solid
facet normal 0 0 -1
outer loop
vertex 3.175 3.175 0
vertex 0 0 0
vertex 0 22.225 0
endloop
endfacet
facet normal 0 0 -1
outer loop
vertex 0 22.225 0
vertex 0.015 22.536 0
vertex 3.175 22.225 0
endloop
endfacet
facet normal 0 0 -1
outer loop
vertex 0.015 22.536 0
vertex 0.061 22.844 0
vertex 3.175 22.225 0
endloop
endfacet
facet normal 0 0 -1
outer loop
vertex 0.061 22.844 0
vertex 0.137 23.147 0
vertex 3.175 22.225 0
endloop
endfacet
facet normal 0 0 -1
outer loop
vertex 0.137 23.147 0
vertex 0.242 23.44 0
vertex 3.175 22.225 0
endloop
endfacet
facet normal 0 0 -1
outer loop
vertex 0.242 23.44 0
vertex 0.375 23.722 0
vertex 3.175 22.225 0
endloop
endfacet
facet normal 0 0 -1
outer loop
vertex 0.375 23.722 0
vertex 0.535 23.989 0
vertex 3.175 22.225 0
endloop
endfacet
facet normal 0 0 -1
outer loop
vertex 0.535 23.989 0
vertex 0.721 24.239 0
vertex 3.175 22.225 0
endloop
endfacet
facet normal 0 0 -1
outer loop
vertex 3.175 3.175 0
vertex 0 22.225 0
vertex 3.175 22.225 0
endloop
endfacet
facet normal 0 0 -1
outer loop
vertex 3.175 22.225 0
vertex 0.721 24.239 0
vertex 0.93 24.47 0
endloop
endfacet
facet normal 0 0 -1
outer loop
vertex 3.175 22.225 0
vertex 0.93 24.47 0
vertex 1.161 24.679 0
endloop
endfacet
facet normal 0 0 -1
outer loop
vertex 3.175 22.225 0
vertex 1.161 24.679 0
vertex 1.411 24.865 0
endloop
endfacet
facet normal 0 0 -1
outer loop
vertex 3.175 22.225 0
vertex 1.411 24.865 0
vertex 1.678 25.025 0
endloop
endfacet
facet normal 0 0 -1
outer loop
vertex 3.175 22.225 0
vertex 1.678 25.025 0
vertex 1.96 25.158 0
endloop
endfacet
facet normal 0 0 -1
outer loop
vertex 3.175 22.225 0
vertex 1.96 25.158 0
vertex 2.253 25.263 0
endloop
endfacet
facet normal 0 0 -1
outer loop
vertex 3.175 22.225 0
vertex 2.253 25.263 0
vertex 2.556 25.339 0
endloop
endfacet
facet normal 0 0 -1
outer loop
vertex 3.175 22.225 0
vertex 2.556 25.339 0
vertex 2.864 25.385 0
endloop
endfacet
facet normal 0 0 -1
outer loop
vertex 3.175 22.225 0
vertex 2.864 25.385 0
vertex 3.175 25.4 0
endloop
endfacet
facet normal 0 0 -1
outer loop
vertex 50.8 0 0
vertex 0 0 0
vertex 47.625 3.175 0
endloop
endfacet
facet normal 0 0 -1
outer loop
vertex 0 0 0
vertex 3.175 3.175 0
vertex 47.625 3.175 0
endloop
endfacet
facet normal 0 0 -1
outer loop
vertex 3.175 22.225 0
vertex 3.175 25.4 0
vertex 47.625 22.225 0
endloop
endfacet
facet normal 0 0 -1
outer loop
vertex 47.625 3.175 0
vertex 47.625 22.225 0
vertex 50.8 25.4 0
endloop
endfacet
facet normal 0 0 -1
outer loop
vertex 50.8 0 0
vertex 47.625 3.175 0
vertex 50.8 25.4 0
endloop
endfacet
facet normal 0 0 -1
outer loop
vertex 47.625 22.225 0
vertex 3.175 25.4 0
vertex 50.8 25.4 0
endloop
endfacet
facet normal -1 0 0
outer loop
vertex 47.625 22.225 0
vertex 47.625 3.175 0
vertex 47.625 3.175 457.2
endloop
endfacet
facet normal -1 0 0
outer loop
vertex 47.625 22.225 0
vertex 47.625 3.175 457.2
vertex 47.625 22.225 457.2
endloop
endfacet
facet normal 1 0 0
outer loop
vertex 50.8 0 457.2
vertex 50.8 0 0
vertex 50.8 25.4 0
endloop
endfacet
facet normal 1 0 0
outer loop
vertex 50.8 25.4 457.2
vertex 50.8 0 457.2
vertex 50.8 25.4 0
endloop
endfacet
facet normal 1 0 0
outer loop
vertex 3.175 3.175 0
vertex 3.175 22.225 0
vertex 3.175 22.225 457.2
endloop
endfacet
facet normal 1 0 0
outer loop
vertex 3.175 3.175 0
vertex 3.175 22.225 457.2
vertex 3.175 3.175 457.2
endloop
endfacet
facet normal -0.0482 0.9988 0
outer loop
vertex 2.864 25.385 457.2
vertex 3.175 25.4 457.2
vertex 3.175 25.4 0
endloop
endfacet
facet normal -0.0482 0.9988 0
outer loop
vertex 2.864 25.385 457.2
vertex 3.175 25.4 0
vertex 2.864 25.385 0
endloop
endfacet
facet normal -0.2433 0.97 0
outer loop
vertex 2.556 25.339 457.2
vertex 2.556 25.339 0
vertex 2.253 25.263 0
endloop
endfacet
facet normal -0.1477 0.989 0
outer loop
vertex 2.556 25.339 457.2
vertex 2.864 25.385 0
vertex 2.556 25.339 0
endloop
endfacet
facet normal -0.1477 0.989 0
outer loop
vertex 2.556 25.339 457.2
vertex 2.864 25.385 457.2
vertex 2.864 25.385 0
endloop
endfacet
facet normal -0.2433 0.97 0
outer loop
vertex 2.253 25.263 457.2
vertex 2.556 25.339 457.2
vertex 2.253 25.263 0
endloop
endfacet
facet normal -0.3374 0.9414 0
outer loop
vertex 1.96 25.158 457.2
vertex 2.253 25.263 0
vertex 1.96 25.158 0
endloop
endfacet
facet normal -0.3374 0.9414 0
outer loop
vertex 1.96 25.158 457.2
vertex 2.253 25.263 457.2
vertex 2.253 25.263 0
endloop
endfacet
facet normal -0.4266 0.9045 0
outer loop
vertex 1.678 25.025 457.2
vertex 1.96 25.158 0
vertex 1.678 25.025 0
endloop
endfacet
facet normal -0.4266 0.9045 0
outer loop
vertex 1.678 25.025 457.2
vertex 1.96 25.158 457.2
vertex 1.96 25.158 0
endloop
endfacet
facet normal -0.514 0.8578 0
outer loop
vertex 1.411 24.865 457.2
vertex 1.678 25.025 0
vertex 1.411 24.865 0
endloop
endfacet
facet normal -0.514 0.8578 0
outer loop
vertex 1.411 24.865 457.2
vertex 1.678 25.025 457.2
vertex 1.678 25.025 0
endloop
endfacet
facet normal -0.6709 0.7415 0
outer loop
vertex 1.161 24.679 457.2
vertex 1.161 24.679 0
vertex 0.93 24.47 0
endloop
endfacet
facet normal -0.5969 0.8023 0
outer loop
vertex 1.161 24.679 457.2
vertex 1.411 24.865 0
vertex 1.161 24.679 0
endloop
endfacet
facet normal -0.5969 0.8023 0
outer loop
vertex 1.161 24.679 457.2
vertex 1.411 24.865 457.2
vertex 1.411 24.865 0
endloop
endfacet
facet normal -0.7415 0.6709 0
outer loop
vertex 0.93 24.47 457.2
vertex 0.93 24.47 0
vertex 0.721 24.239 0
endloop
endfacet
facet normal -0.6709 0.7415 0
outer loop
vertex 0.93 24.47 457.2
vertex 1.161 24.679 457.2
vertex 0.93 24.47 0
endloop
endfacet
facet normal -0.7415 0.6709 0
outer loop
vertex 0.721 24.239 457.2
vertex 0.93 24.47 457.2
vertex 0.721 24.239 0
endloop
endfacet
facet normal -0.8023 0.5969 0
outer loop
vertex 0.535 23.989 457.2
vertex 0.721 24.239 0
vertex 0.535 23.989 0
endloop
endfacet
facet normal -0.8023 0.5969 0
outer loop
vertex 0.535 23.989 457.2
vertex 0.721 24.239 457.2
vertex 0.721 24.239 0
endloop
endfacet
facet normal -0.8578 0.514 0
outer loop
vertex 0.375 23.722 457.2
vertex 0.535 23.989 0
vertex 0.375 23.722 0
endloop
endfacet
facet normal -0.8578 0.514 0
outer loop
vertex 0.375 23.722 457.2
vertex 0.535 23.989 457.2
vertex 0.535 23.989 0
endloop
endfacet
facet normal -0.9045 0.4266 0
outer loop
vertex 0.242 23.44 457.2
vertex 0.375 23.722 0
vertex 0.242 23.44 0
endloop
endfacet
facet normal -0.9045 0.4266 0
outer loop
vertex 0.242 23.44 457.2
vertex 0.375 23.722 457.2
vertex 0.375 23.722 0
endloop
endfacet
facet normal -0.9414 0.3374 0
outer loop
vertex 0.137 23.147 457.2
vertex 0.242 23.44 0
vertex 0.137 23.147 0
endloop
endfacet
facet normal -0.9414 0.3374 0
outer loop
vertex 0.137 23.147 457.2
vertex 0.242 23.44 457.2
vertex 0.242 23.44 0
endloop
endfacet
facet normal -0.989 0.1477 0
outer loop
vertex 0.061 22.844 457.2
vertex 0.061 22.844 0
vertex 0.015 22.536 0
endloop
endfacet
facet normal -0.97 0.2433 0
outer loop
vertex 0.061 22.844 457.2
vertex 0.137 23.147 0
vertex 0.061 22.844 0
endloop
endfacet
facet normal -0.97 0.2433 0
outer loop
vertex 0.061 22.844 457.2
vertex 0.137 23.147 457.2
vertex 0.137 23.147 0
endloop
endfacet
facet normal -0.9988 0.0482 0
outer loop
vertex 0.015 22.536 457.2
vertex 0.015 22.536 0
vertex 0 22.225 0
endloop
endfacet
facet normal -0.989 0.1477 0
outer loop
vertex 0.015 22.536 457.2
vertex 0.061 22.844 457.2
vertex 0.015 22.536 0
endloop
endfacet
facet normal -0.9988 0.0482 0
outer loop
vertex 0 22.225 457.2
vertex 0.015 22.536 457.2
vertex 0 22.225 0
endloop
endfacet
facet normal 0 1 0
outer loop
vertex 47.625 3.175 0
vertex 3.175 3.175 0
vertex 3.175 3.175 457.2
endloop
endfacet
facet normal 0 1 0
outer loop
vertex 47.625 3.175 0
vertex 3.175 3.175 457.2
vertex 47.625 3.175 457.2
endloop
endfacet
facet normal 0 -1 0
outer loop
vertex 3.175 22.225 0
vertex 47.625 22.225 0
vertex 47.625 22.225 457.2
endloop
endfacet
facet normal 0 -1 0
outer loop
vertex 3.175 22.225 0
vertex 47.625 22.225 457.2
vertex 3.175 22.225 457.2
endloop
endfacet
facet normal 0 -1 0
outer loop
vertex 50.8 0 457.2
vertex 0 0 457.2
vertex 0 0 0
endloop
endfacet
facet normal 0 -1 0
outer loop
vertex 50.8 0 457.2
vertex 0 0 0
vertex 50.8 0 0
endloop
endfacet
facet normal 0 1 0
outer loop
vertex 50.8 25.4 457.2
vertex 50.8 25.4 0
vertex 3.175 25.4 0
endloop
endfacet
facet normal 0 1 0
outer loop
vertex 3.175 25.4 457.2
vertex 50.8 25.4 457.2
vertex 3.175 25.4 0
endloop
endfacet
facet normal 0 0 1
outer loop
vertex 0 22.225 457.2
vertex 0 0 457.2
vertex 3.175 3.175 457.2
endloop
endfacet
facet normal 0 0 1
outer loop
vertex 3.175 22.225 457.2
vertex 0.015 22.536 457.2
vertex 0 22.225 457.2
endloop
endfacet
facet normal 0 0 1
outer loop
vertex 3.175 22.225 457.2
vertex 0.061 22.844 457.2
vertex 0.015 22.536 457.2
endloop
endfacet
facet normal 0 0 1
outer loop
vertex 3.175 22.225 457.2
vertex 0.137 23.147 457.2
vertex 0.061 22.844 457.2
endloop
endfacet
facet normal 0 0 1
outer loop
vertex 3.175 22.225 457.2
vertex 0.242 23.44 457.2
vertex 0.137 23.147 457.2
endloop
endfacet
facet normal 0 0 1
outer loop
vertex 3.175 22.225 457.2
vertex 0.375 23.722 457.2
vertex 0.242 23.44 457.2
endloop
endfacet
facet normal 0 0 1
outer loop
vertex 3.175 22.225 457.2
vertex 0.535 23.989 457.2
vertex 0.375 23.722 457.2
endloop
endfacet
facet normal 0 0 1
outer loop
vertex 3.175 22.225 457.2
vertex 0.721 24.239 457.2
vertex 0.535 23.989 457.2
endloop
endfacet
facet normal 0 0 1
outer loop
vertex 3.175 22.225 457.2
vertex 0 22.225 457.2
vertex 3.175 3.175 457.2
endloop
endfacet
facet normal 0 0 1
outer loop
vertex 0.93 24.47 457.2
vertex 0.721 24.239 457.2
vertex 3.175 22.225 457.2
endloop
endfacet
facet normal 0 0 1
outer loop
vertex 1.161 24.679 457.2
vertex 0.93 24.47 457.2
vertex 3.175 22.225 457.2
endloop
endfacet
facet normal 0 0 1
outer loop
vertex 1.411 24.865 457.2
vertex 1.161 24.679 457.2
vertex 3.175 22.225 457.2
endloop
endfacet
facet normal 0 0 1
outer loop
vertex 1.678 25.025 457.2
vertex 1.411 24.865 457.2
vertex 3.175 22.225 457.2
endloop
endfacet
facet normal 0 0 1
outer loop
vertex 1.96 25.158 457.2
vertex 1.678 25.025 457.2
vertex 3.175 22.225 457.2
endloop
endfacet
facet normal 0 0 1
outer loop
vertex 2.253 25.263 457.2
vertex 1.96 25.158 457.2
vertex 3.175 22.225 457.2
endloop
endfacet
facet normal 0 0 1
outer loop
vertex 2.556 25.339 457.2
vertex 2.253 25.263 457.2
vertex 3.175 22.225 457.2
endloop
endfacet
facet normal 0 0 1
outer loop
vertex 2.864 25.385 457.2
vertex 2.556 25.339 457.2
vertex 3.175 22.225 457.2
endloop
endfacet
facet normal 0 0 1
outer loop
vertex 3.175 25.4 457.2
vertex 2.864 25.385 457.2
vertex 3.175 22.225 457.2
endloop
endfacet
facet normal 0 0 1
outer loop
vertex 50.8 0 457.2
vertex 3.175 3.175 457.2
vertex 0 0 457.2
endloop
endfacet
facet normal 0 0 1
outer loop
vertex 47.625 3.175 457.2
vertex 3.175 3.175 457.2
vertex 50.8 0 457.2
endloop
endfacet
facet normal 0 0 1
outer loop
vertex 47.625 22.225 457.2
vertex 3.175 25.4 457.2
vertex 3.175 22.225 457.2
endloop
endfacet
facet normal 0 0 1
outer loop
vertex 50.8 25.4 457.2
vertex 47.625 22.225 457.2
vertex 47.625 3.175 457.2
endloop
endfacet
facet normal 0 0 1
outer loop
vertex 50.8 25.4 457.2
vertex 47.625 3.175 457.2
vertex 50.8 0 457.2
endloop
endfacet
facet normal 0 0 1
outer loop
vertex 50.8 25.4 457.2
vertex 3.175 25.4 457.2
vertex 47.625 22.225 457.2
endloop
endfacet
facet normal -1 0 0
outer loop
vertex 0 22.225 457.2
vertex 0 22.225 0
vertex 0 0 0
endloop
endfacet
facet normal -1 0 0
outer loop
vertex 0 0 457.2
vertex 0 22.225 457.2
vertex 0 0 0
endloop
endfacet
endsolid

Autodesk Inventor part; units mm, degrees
ref_plane "YZ Plane" through (0, 0, 0) normal (1, 0, 0) x (0, 1, 0)
ref_plane "XZ Plane" through (0, 0, 0) normal (0, 1, 0) x (-1, 0, 0)
ref_plane "XY Plane" through (0, 0, 0) normal (0, 0, 1) x (1, 0, 0)
sketch "Sketch1" plane through (0, 0, 0) normal (0, 0, 1) x (1, 0, 0)
  line L0 (0, 0) -> (50.8, 0)
  line L1 (50.8, 0) -> (50.8, 25.4)
  line L2 (50.8, 25.4) -> (0, 25.4)
  line L3 (0, 25.4) -> (0, 0)
  line L4 (3.175, 3.175) -> (47.625, 3.175)
  line L5 (47.625, 3.175) -> (47.625, 22.225)
  line L6 (47.625, 22.225) -> (3.175, 22.225)
  line L7 (3.175, 22.225) -> (3.175, 3.175)
  dimension "d0" = 50.8
  dimension "d1" = 25.4
  dimension "d2" = 3.175
  dimension "d3" = 3.175
  dimension "d4" = 3.175
  dimension "d5" = 3.175
extrude "Extrusion1" add sketch "Sketch1" along normal blind 457.2
fillet "Fillet1" radius 3.175 1 edges at (0, 25.4, 228.6)
equation "\"d3\" = d2"
equation "\"d4\" = d2"
equation "\"d5\" = d3"
properties part number "Bolt On Cross Supprot" material "Aluminum 6061"
